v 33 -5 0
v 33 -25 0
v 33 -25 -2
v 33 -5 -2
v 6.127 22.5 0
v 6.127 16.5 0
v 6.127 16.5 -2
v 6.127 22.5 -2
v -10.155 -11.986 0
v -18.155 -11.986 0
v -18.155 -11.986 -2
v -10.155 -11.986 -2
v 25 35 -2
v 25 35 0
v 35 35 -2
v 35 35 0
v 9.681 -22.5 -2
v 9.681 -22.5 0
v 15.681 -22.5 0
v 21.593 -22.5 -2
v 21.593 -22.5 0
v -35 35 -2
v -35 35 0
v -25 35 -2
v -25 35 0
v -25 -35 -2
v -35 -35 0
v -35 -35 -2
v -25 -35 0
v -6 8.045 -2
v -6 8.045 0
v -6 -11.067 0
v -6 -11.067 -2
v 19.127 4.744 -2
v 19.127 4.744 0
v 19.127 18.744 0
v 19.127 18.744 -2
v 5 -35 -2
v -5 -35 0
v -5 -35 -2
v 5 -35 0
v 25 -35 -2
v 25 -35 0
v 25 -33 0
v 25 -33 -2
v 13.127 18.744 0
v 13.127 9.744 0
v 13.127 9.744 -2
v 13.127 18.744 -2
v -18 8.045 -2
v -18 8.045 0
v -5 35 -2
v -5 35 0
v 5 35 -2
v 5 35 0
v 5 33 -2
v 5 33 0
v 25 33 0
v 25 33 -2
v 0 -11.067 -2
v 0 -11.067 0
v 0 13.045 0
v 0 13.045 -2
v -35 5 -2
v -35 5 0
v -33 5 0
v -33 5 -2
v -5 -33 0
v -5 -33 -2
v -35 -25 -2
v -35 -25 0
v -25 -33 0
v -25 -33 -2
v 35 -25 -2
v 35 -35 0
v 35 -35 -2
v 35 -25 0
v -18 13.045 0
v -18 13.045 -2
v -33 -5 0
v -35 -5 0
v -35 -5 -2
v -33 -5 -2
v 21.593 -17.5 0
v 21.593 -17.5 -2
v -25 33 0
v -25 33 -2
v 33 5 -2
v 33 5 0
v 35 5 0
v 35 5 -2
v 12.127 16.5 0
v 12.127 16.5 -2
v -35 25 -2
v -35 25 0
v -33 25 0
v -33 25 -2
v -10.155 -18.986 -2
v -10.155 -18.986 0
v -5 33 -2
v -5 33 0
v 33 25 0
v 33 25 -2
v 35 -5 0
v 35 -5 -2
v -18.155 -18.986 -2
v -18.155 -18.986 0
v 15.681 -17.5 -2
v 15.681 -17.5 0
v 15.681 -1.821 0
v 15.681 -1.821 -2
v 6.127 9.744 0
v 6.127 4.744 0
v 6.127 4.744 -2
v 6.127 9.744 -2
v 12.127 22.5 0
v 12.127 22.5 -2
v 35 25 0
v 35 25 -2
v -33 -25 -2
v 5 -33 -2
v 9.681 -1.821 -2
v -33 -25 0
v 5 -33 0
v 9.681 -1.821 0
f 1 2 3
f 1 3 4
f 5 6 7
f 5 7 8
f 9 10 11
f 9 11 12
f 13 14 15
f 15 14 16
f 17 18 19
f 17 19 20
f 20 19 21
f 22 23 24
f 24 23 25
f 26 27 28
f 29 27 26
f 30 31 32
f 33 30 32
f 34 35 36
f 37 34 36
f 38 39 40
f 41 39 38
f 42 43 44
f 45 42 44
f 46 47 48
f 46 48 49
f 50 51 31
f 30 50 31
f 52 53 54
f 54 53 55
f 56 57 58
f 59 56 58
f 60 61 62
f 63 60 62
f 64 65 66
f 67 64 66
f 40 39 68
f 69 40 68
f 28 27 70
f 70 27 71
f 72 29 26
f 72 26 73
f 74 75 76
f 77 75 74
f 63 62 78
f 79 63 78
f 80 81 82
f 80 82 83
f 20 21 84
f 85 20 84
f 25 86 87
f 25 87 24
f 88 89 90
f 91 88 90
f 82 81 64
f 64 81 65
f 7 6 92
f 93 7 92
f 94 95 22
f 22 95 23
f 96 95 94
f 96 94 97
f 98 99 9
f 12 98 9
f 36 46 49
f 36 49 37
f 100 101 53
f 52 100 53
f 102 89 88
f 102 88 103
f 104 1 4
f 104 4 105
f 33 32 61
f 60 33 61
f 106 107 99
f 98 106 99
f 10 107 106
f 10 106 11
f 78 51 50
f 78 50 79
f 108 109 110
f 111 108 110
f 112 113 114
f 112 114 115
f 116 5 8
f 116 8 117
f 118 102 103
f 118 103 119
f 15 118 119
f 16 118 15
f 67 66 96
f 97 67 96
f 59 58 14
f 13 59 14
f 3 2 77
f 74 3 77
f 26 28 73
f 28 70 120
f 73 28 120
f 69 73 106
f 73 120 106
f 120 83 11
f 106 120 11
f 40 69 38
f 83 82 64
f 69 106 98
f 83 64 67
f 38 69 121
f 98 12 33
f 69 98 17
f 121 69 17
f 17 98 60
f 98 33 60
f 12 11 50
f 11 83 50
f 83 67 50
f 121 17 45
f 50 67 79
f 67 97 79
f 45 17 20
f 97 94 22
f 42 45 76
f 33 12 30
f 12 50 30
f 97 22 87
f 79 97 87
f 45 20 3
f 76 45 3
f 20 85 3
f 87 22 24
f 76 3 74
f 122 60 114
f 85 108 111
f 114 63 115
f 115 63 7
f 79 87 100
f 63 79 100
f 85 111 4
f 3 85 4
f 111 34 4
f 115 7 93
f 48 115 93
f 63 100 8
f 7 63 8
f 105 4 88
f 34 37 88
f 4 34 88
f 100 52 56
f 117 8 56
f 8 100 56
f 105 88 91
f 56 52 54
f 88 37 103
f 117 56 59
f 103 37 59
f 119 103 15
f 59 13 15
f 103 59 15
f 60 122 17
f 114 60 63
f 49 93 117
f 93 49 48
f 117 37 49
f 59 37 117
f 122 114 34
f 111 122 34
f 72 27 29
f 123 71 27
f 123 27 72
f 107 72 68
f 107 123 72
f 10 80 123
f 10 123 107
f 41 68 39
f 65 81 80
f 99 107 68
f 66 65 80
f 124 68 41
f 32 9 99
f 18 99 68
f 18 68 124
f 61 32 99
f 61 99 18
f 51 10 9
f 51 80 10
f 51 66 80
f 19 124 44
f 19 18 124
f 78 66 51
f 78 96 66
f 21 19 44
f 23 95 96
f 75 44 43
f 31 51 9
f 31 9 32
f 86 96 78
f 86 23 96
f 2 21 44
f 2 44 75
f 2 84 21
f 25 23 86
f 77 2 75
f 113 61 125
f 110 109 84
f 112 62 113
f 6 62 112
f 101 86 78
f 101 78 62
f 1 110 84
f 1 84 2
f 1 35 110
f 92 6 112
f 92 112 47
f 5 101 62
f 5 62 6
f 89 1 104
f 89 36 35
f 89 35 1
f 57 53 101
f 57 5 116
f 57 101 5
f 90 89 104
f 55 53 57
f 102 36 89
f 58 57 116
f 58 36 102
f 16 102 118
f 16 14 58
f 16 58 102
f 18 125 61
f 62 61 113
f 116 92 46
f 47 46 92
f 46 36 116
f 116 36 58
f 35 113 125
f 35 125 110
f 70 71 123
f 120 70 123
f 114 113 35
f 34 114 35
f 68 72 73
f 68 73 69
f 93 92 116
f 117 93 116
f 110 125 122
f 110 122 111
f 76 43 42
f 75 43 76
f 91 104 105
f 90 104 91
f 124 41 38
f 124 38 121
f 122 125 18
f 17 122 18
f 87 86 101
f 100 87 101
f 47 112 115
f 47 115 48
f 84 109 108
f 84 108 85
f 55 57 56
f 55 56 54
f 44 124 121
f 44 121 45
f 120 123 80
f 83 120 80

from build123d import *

# Parameters (mm, degrees)
SKETCH1_W           = 70
SKETCH1_H           = 70
BOSS_EXTRUDE1_DEPTH = 2
SKETCH2_W           = 2
SKETCH2_H           = 20
SKETCH2_W_2         = 20
SKETCH2_H_2         = 2
CUT_EXTRUDE1_DEPTH  = 2
SKETCH3_W           = 6
SKETCH3_H           = 14
SKETCH3_W_2         = 7
SKETCH3_H_2         = 5
SKETCH3_H_3         = 6
SKETCH3_H_4         = 11
SKETCH3_H_5         = 9.678877381
SKETCH3_W_3         = 5.911764375
SKETCH3_W_4         = 8
SKETCH3_H_6         = 7
SKETCH3_H_7         = 11.067115318
SKETCH3_H_8         = 13.044819002
SKETCH3_W_5         = 12
CUT_EXTRUDE2_DEPTH  = 10


with BuildPart() as part:
    # Sketch1 → Boss-Extrude1 (new body)
    with BuildSketch(Plane.XY):
        Rectangle(SKETCH1_W, SKETCH1_H)
    extrude(amount=-BOSS_EXTRUDE1_DEPTH)

    # Sketch2 → Cut-Extrude1 (cut)
    with BuildSketch(Plane.XY):
        with Locations((-34, 15)):
            Rectangle(SKETCH2_W, SKETCH2_H)
        with Locations((-34, -15)):
            Rectangle(SKETCH2_W, SKETCH2_H)
        with Locations((-15, -34)):
            Rectangle(SKETCH2_W_2, SKETCH2_H_2)
        with Locations((15, -34)):
            Rectangle(SKETCH2_W_2, SKETCH2_H_2)
        with Locations((34, -15)):
            Rectangle(SKETCH2_W, SKETCH2_H)
        with Locations((34, 15)):
            Rectangle(SKETCH2_W, SKETCH2_H)
        with Locations((15, 34)):
            Rectangle(SKETCH2_W_2, SKETCH2_H_2)
        with Locations((-15, 34)):
            Rectangle(SKETCH2_W_2, SKETCH2_H_2)
    extrude(amount=-CUT_EXTRUDE1_DEPTH, mode=Mode.SUBTRACT)

    # Sketch3 → Cut-Extrude2 (cut)
    with BuildSketch(Plane.XY):
        with Locations((16.127037524, 11.743568931)):
            Rectangle(SKETCH3_W, SKETCH3_H)
        with Locations((9.627037524, 7.243568931)):
            Rectangle(SKETCH3_W_2, SKETCH3_H_2)
        with Locations((9.127037524, 19.5)):
            Rectangle(SKETCH3_W, SKETCH3_H_3)
        with Locations((12.681095539, -7.321122619)):
            Rectangle(SKETCH3_W, SKETCH3_H_4)
        with Locations((12.681095539, -17.66056131)):
            Rectangle(SKETCH3_W, SKETCH3_H_5)
        with Locations((18.636977726, -20)):
            Rectangle(SKETCH3_W_3, SKETCH3_H_2)
        with Locations((-14.154511362, -15.485830005)):
            Rectangle(SKETCH3_W_4, SKETCH3_H_6)
        with Locations((-3, -5.533557659)):
            Rectangle(SKETCH3_W, SKETCH3_H_7)
        with Locations((-3, 6.522409501)):
            Rectangle(SKETCH3_W, SKETCH3_H_8)
        with Locations((-12, 10.544819002)):
            Rectangle(SKETCH3_W_5, SKETCH3_H_2)
    extrude(amount=-CUT_EXTRUDE2_DEPTH, mode=Mode.SUBTRACT)


solid = part.part
